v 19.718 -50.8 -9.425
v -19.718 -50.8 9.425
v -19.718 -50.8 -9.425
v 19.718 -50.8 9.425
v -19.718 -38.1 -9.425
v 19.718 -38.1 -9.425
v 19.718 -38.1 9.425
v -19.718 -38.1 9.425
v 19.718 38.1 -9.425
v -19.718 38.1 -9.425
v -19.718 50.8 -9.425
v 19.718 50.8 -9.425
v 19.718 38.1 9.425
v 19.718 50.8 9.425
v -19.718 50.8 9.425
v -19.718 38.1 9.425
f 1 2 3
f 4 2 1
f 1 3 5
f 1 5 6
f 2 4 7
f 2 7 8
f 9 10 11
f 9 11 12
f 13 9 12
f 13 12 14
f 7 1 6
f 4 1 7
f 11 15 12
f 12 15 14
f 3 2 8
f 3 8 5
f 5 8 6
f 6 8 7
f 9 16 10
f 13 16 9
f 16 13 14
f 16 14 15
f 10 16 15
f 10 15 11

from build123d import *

# Parameters (mm, degrees)
F1_DEPTH = 50.8
F2_DEPTH = 38.1
F3_DEPTH = 25.4


with BuildPart() as f1:
    # F0 (on Front) → F1 (new body, symmetric)
    with BuildSketch(Plane.XZ):
        Polygon((-19.718429, -9.424795), (19.718429, -9.424795), (19.718429, 9.424795), (8.622639, 9.424795), (-19.718429, 9.424795), align=None)
    extrude(amount=F1_DEPTH, both=True)

    # F0 (on Front) → F2 (cut, symmetric)
    with BuildSketch(Plane.XZ):
        Polygon((-19.718429, -9.424795), (19.718429, -9.424795), (19.718429, 9.424795), (8.622639, 9.424795), (-19.718429, 9.424795), align=None)
        with BuildLine():
            Line((8.622639, 9.424795), (19.718429, 9.424795))
            Line((19.718429, 9.424795), (19.718429, 16.443158))
            ThreePointArc((19.718429, 16.443158), (21.343754, 20.367038), (25.267634, 21.992363))
            Line((25.267634, 21.992363), (34.490546, 21.992363))
            Line((34.490546, 21.992363), (34.490546, 33.088153))
            Line((34.490546, 33.088153), (25.267634, 33.088153))
            ThreePointArc((25.267634, 33.088153), (13.497845, 28.212947), (8.622639, 16.443158))
            Line((8.622639, 16.443158), (8.622639, 9.424795))
        make_face()
    extrude(amount=F2_DEPTH, both=True, mode=Mode.SUBTRACT)

    # F0 (on Front) → F3 (cut, symmetric)
    with BuildSketch(Plane.XZ):
        with BuildLine():
            add(Edge.make_bspline(
                [(-19.718429, 9.424795), (-19.792453, 30.460717), (0, 33.08684), (25.267634, 33.088153)],
                knots=[0, 0, 0, 0, 50.830113, 50.830113, 50.830113, 50.830113], degree=3))
            Line((-19.718429, 9.424795), (8.622639, 9.424795))
            Line((8.622639, 9.424795), (8.622639, 16.443158))
            ThreePointArc((8.622639, 16.443158), (13.497845, 28.212947), (25.267634, 33.088153))
        make_face()
    extrude(amount=F3_DEPTH, both=True, mode=Mode.SUBTRACT)


solid = f1.part
